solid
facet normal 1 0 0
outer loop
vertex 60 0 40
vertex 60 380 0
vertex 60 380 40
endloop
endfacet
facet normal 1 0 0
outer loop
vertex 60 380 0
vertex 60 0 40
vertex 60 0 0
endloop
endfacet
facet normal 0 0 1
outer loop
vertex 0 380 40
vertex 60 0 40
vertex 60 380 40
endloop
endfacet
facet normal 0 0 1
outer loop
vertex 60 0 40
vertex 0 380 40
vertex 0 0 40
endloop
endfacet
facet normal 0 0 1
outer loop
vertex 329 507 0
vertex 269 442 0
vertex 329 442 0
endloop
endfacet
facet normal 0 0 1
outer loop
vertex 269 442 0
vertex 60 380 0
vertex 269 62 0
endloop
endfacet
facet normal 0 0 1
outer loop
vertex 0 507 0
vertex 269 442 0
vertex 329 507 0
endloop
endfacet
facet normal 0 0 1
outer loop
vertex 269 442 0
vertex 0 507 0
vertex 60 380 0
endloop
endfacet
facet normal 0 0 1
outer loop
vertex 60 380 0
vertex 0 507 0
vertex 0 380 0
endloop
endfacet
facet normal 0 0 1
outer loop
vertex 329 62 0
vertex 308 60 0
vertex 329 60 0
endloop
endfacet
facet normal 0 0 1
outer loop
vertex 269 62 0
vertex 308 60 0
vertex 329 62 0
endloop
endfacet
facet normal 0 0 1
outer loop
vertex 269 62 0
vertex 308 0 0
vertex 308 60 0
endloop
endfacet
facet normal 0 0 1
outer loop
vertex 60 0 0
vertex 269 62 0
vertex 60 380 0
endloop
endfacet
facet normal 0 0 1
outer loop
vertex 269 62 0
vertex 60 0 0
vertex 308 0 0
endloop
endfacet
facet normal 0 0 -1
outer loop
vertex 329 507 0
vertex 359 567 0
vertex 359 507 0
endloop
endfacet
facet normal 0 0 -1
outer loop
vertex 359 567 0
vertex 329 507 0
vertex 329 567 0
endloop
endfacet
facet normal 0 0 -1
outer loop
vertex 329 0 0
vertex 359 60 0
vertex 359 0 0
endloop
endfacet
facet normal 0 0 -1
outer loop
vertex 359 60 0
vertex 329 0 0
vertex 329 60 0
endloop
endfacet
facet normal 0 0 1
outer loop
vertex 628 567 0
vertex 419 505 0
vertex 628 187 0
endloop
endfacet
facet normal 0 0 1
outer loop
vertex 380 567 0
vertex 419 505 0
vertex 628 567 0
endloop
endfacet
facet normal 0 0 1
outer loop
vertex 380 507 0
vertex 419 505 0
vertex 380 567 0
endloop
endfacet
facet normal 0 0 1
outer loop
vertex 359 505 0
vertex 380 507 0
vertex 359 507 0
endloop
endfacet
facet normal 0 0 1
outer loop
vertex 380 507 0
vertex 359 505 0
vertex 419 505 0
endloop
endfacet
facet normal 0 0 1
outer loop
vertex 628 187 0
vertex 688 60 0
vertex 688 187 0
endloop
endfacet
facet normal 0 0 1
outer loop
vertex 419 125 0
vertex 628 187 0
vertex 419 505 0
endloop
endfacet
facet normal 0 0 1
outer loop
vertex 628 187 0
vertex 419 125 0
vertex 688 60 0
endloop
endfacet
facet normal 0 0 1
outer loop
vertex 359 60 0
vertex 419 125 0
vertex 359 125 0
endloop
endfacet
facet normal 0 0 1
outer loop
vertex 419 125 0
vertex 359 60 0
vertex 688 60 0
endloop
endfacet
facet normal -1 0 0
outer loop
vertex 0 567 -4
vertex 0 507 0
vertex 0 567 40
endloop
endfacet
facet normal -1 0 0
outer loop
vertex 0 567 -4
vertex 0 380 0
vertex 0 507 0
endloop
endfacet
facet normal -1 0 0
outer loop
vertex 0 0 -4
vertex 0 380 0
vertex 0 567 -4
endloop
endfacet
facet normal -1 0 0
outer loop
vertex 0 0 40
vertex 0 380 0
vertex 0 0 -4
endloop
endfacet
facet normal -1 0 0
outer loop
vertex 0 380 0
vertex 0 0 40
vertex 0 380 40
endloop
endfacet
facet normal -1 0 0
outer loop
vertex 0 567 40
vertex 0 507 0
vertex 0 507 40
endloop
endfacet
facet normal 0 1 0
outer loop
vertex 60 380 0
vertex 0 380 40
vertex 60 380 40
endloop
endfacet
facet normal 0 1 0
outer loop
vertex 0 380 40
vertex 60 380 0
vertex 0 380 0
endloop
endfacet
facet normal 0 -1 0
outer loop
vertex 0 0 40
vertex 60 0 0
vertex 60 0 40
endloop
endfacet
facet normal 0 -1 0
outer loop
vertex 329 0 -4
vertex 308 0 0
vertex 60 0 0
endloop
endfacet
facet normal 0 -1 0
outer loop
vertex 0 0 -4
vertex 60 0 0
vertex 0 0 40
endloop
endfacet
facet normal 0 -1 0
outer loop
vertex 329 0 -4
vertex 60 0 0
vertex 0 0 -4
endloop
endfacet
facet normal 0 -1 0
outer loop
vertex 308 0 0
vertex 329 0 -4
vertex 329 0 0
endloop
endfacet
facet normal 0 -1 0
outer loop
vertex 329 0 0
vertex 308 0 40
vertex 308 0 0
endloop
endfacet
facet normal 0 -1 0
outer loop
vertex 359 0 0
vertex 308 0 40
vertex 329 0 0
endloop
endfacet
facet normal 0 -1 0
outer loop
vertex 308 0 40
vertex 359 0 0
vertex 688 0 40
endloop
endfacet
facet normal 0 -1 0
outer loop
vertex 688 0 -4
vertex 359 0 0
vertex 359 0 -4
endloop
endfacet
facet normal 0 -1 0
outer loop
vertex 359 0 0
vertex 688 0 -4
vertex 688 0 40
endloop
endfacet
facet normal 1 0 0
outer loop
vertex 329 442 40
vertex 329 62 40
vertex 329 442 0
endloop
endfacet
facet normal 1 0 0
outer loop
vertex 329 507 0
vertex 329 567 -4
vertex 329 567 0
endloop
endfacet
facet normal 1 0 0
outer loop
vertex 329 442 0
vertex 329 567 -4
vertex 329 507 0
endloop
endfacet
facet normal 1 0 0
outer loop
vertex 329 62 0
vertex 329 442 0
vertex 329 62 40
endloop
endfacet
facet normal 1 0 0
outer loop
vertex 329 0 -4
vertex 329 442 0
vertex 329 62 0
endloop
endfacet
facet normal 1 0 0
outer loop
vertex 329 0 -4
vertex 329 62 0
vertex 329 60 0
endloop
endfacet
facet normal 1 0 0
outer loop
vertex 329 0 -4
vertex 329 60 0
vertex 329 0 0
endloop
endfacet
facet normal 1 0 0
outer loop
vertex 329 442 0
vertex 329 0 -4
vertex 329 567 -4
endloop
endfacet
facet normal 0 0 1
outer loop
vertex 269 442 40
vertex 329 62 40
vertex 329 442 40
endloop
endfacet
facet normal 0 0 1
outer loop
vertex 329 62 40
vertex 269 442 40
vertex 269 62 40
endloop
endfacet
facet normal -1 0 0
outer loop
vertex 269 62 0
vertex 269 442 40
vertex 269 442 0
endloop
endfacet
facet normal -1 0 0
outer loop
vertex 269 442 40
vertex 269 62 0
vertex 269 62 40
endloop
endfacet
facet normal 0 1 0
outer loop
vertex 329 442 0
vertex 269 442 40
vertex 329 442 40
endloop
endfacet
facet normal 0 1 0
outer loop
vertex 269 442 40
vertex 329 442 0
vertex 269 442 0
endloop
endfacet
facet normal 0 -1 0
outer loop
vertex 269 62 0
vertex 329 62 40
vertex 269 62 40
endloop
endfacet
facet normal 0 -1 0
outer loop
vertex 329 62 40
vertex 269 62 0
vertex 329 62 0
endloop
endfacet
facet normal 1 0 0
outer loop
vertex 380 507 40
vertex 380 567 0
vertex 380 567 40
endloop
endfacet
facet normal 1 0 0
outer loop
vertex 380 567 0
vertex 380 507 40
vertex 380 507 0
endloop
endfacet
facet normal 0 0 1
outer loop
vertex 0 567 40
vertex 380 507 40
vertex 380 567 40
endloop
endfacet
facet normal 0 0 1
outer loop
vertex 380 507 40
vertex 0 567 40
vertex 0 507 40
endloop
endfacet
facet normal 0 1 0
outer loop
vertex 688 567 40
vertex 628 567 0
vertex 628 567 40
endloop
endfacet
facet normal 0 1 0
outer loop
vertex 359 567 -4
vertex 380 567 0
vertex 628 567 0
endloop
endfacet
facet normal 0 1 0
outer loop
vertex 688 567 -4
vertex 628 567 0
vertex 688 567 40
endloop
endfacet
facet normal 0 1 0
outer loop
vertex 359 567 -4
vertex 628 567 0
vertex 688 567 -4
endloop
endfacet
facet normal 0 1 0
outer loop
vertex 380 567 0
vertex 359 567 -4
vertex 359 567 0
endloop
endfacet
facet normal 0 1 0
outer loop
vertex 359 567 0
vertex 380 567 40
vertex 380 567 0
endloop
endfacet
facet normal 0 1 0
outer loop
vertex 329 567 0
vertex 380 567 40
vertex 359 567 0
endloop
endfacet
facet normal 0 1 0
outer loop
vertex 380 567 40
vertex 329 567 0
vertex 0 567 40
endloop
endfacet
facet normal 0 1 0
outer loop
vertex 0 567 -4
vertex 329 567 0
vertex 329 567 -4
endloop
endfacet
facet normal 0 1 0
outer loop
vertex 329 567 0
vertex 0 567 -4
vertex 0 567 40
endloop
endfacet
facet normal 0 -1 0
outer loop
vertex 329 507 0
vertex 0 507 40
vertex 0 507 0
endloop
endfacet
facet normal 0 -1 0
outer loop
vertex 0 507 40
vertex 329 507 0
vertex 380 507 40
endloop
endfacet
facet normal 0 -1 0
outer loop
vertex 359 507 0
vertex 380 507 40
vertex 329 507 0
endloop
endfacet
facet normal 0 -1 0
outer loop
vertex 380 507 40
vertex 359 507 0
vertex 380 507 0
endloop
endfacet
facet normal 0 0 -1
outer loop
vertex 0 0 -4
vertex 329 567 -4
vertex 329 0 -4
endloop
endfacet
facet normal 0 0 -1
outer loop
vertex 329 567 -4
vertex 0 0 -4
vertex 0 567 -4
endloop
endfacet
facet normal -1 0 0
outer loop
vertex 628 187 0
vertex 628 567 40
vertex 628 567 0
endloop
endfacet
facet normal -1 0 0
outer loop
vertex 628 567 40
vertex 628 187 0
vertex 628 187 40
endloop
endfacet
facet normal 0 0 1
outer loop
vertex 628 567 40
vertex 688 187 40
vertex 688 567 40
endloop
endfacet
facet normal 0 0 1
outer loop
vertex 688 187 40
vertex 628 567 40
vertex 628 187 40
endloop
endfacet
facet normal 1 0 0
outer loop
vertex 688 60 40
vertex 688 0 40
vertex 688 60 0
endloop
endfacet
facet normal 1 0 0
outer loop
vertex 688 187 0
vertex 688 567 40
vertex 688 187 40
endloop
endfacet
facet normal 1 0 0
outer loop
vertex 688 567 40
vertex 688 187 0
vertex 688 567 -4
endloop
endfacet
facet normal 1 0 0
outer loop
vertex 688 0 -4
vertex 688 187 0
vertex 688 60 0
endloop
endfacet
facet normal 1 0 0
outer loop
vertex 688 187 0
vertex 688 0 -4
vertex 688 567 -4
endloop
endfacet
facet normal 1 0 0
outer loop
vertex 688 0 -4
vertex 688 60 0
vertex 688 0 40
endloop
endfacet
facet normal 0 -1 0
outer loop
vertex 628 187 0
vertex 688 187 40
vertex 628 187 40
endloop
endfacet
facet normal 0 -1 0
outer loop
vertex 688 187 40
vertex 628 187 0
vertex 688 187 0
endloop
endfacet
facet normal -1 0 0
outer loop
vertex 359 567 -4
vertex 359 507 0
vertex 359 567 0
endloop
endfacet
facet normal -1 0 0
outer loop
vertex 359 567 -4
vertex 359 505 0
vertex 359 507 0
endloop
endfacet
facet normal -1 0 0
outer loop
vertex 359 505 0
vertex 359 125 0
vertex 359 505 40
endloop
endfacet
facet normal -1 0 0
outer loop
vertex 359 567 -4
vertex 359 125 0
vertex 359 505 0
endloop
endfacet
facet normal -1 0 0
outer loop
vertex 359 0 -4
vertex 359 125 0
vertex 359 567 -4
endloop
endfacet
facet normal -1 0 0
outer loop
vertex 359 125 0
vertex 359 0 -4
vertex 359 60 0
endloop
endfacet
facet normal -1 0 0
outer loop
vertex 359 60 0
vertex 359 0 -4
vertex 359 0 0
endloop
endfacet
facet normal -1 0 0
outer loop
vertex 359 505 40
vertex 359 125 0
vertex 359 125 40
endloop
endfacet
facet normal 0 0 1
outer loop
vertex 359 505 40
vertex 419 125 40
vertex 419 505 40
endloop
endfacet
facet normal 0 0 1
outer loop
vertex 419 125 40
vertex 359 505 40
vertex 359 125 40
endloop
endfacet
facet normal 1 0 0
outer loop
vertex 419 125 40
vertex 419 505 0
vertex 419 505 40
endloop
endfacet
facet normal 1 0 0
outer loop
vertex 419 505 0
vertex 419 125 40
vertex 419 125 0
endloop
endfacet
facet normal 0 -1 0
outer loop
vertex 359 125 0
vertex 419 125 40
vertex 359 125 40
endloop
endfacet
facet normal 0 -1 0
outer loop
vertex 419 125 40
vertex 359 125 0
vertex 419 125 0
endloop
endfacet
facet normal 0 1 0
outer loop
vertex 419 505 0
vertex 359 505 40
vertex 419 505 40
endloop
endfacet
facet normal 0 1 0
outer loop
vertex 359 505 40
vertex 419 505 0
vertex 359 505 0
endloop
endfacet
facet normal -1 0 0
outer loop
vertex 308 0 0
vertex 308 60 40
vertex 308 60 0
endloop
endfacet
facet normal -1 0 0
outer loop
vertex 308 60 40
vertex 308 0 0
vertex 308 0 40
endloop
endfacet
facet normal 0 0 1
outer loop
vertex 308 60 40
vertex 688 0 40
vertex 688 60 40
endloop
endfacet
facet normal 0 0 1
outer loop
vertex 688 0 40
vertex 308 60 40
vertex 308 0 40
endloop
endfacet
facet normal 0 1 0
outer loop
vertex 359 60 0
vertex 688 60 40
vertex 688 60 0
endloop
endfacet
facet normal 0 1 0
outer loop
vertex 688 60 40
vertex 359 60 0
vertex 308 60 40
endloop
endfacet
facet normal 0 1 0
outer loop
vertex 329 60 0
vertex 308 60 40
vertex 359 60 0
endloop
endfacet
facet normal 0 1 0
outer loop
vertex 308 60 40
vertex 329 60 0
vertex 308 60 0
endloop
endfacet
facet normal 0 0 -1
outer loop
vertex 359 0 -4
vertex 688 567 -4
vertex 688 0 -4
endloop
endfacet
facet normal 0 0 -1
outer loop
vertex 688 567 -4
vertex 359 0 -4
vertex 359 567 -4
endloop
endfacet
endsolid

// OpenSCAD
// Schweißtisch geschlossen

vkr_h=40;
vkr_l=380;
vkr_b=60;

p_h=4;
p_l=567;
p_b=329;

clear=2;
dist=30;

module mod() {
    // 1. bar
    color( "Olive", 1.0 ) {
        cube([vkr_b,vkr_l,vkr_h], 0);
    };

    // 2. bar
    translate([p_b-vkr_b,vkr_b+clear,0]) {
        color( "Lime", 1.0 ) {
            cube([vkr_b,vkr_l,vkr_h], 0);
        };
    };

    // 2. bar
    translate([0,p_l-vkr_b,0]) {
        color( "ForestGreen", 1.0 ) {
            cube([vkr_l,vkr_b,vkr_h], 0);
        };
    };

    // Plate
    translate([0,0,-p_h]) {
        cube([p_b,p_l,p_h], 0);
    };
};


mod();

translate([p_b*2+dist,p_l,0]) {
    rotate(a=180, v=[0,0,1]){
        mod();
    };
};
